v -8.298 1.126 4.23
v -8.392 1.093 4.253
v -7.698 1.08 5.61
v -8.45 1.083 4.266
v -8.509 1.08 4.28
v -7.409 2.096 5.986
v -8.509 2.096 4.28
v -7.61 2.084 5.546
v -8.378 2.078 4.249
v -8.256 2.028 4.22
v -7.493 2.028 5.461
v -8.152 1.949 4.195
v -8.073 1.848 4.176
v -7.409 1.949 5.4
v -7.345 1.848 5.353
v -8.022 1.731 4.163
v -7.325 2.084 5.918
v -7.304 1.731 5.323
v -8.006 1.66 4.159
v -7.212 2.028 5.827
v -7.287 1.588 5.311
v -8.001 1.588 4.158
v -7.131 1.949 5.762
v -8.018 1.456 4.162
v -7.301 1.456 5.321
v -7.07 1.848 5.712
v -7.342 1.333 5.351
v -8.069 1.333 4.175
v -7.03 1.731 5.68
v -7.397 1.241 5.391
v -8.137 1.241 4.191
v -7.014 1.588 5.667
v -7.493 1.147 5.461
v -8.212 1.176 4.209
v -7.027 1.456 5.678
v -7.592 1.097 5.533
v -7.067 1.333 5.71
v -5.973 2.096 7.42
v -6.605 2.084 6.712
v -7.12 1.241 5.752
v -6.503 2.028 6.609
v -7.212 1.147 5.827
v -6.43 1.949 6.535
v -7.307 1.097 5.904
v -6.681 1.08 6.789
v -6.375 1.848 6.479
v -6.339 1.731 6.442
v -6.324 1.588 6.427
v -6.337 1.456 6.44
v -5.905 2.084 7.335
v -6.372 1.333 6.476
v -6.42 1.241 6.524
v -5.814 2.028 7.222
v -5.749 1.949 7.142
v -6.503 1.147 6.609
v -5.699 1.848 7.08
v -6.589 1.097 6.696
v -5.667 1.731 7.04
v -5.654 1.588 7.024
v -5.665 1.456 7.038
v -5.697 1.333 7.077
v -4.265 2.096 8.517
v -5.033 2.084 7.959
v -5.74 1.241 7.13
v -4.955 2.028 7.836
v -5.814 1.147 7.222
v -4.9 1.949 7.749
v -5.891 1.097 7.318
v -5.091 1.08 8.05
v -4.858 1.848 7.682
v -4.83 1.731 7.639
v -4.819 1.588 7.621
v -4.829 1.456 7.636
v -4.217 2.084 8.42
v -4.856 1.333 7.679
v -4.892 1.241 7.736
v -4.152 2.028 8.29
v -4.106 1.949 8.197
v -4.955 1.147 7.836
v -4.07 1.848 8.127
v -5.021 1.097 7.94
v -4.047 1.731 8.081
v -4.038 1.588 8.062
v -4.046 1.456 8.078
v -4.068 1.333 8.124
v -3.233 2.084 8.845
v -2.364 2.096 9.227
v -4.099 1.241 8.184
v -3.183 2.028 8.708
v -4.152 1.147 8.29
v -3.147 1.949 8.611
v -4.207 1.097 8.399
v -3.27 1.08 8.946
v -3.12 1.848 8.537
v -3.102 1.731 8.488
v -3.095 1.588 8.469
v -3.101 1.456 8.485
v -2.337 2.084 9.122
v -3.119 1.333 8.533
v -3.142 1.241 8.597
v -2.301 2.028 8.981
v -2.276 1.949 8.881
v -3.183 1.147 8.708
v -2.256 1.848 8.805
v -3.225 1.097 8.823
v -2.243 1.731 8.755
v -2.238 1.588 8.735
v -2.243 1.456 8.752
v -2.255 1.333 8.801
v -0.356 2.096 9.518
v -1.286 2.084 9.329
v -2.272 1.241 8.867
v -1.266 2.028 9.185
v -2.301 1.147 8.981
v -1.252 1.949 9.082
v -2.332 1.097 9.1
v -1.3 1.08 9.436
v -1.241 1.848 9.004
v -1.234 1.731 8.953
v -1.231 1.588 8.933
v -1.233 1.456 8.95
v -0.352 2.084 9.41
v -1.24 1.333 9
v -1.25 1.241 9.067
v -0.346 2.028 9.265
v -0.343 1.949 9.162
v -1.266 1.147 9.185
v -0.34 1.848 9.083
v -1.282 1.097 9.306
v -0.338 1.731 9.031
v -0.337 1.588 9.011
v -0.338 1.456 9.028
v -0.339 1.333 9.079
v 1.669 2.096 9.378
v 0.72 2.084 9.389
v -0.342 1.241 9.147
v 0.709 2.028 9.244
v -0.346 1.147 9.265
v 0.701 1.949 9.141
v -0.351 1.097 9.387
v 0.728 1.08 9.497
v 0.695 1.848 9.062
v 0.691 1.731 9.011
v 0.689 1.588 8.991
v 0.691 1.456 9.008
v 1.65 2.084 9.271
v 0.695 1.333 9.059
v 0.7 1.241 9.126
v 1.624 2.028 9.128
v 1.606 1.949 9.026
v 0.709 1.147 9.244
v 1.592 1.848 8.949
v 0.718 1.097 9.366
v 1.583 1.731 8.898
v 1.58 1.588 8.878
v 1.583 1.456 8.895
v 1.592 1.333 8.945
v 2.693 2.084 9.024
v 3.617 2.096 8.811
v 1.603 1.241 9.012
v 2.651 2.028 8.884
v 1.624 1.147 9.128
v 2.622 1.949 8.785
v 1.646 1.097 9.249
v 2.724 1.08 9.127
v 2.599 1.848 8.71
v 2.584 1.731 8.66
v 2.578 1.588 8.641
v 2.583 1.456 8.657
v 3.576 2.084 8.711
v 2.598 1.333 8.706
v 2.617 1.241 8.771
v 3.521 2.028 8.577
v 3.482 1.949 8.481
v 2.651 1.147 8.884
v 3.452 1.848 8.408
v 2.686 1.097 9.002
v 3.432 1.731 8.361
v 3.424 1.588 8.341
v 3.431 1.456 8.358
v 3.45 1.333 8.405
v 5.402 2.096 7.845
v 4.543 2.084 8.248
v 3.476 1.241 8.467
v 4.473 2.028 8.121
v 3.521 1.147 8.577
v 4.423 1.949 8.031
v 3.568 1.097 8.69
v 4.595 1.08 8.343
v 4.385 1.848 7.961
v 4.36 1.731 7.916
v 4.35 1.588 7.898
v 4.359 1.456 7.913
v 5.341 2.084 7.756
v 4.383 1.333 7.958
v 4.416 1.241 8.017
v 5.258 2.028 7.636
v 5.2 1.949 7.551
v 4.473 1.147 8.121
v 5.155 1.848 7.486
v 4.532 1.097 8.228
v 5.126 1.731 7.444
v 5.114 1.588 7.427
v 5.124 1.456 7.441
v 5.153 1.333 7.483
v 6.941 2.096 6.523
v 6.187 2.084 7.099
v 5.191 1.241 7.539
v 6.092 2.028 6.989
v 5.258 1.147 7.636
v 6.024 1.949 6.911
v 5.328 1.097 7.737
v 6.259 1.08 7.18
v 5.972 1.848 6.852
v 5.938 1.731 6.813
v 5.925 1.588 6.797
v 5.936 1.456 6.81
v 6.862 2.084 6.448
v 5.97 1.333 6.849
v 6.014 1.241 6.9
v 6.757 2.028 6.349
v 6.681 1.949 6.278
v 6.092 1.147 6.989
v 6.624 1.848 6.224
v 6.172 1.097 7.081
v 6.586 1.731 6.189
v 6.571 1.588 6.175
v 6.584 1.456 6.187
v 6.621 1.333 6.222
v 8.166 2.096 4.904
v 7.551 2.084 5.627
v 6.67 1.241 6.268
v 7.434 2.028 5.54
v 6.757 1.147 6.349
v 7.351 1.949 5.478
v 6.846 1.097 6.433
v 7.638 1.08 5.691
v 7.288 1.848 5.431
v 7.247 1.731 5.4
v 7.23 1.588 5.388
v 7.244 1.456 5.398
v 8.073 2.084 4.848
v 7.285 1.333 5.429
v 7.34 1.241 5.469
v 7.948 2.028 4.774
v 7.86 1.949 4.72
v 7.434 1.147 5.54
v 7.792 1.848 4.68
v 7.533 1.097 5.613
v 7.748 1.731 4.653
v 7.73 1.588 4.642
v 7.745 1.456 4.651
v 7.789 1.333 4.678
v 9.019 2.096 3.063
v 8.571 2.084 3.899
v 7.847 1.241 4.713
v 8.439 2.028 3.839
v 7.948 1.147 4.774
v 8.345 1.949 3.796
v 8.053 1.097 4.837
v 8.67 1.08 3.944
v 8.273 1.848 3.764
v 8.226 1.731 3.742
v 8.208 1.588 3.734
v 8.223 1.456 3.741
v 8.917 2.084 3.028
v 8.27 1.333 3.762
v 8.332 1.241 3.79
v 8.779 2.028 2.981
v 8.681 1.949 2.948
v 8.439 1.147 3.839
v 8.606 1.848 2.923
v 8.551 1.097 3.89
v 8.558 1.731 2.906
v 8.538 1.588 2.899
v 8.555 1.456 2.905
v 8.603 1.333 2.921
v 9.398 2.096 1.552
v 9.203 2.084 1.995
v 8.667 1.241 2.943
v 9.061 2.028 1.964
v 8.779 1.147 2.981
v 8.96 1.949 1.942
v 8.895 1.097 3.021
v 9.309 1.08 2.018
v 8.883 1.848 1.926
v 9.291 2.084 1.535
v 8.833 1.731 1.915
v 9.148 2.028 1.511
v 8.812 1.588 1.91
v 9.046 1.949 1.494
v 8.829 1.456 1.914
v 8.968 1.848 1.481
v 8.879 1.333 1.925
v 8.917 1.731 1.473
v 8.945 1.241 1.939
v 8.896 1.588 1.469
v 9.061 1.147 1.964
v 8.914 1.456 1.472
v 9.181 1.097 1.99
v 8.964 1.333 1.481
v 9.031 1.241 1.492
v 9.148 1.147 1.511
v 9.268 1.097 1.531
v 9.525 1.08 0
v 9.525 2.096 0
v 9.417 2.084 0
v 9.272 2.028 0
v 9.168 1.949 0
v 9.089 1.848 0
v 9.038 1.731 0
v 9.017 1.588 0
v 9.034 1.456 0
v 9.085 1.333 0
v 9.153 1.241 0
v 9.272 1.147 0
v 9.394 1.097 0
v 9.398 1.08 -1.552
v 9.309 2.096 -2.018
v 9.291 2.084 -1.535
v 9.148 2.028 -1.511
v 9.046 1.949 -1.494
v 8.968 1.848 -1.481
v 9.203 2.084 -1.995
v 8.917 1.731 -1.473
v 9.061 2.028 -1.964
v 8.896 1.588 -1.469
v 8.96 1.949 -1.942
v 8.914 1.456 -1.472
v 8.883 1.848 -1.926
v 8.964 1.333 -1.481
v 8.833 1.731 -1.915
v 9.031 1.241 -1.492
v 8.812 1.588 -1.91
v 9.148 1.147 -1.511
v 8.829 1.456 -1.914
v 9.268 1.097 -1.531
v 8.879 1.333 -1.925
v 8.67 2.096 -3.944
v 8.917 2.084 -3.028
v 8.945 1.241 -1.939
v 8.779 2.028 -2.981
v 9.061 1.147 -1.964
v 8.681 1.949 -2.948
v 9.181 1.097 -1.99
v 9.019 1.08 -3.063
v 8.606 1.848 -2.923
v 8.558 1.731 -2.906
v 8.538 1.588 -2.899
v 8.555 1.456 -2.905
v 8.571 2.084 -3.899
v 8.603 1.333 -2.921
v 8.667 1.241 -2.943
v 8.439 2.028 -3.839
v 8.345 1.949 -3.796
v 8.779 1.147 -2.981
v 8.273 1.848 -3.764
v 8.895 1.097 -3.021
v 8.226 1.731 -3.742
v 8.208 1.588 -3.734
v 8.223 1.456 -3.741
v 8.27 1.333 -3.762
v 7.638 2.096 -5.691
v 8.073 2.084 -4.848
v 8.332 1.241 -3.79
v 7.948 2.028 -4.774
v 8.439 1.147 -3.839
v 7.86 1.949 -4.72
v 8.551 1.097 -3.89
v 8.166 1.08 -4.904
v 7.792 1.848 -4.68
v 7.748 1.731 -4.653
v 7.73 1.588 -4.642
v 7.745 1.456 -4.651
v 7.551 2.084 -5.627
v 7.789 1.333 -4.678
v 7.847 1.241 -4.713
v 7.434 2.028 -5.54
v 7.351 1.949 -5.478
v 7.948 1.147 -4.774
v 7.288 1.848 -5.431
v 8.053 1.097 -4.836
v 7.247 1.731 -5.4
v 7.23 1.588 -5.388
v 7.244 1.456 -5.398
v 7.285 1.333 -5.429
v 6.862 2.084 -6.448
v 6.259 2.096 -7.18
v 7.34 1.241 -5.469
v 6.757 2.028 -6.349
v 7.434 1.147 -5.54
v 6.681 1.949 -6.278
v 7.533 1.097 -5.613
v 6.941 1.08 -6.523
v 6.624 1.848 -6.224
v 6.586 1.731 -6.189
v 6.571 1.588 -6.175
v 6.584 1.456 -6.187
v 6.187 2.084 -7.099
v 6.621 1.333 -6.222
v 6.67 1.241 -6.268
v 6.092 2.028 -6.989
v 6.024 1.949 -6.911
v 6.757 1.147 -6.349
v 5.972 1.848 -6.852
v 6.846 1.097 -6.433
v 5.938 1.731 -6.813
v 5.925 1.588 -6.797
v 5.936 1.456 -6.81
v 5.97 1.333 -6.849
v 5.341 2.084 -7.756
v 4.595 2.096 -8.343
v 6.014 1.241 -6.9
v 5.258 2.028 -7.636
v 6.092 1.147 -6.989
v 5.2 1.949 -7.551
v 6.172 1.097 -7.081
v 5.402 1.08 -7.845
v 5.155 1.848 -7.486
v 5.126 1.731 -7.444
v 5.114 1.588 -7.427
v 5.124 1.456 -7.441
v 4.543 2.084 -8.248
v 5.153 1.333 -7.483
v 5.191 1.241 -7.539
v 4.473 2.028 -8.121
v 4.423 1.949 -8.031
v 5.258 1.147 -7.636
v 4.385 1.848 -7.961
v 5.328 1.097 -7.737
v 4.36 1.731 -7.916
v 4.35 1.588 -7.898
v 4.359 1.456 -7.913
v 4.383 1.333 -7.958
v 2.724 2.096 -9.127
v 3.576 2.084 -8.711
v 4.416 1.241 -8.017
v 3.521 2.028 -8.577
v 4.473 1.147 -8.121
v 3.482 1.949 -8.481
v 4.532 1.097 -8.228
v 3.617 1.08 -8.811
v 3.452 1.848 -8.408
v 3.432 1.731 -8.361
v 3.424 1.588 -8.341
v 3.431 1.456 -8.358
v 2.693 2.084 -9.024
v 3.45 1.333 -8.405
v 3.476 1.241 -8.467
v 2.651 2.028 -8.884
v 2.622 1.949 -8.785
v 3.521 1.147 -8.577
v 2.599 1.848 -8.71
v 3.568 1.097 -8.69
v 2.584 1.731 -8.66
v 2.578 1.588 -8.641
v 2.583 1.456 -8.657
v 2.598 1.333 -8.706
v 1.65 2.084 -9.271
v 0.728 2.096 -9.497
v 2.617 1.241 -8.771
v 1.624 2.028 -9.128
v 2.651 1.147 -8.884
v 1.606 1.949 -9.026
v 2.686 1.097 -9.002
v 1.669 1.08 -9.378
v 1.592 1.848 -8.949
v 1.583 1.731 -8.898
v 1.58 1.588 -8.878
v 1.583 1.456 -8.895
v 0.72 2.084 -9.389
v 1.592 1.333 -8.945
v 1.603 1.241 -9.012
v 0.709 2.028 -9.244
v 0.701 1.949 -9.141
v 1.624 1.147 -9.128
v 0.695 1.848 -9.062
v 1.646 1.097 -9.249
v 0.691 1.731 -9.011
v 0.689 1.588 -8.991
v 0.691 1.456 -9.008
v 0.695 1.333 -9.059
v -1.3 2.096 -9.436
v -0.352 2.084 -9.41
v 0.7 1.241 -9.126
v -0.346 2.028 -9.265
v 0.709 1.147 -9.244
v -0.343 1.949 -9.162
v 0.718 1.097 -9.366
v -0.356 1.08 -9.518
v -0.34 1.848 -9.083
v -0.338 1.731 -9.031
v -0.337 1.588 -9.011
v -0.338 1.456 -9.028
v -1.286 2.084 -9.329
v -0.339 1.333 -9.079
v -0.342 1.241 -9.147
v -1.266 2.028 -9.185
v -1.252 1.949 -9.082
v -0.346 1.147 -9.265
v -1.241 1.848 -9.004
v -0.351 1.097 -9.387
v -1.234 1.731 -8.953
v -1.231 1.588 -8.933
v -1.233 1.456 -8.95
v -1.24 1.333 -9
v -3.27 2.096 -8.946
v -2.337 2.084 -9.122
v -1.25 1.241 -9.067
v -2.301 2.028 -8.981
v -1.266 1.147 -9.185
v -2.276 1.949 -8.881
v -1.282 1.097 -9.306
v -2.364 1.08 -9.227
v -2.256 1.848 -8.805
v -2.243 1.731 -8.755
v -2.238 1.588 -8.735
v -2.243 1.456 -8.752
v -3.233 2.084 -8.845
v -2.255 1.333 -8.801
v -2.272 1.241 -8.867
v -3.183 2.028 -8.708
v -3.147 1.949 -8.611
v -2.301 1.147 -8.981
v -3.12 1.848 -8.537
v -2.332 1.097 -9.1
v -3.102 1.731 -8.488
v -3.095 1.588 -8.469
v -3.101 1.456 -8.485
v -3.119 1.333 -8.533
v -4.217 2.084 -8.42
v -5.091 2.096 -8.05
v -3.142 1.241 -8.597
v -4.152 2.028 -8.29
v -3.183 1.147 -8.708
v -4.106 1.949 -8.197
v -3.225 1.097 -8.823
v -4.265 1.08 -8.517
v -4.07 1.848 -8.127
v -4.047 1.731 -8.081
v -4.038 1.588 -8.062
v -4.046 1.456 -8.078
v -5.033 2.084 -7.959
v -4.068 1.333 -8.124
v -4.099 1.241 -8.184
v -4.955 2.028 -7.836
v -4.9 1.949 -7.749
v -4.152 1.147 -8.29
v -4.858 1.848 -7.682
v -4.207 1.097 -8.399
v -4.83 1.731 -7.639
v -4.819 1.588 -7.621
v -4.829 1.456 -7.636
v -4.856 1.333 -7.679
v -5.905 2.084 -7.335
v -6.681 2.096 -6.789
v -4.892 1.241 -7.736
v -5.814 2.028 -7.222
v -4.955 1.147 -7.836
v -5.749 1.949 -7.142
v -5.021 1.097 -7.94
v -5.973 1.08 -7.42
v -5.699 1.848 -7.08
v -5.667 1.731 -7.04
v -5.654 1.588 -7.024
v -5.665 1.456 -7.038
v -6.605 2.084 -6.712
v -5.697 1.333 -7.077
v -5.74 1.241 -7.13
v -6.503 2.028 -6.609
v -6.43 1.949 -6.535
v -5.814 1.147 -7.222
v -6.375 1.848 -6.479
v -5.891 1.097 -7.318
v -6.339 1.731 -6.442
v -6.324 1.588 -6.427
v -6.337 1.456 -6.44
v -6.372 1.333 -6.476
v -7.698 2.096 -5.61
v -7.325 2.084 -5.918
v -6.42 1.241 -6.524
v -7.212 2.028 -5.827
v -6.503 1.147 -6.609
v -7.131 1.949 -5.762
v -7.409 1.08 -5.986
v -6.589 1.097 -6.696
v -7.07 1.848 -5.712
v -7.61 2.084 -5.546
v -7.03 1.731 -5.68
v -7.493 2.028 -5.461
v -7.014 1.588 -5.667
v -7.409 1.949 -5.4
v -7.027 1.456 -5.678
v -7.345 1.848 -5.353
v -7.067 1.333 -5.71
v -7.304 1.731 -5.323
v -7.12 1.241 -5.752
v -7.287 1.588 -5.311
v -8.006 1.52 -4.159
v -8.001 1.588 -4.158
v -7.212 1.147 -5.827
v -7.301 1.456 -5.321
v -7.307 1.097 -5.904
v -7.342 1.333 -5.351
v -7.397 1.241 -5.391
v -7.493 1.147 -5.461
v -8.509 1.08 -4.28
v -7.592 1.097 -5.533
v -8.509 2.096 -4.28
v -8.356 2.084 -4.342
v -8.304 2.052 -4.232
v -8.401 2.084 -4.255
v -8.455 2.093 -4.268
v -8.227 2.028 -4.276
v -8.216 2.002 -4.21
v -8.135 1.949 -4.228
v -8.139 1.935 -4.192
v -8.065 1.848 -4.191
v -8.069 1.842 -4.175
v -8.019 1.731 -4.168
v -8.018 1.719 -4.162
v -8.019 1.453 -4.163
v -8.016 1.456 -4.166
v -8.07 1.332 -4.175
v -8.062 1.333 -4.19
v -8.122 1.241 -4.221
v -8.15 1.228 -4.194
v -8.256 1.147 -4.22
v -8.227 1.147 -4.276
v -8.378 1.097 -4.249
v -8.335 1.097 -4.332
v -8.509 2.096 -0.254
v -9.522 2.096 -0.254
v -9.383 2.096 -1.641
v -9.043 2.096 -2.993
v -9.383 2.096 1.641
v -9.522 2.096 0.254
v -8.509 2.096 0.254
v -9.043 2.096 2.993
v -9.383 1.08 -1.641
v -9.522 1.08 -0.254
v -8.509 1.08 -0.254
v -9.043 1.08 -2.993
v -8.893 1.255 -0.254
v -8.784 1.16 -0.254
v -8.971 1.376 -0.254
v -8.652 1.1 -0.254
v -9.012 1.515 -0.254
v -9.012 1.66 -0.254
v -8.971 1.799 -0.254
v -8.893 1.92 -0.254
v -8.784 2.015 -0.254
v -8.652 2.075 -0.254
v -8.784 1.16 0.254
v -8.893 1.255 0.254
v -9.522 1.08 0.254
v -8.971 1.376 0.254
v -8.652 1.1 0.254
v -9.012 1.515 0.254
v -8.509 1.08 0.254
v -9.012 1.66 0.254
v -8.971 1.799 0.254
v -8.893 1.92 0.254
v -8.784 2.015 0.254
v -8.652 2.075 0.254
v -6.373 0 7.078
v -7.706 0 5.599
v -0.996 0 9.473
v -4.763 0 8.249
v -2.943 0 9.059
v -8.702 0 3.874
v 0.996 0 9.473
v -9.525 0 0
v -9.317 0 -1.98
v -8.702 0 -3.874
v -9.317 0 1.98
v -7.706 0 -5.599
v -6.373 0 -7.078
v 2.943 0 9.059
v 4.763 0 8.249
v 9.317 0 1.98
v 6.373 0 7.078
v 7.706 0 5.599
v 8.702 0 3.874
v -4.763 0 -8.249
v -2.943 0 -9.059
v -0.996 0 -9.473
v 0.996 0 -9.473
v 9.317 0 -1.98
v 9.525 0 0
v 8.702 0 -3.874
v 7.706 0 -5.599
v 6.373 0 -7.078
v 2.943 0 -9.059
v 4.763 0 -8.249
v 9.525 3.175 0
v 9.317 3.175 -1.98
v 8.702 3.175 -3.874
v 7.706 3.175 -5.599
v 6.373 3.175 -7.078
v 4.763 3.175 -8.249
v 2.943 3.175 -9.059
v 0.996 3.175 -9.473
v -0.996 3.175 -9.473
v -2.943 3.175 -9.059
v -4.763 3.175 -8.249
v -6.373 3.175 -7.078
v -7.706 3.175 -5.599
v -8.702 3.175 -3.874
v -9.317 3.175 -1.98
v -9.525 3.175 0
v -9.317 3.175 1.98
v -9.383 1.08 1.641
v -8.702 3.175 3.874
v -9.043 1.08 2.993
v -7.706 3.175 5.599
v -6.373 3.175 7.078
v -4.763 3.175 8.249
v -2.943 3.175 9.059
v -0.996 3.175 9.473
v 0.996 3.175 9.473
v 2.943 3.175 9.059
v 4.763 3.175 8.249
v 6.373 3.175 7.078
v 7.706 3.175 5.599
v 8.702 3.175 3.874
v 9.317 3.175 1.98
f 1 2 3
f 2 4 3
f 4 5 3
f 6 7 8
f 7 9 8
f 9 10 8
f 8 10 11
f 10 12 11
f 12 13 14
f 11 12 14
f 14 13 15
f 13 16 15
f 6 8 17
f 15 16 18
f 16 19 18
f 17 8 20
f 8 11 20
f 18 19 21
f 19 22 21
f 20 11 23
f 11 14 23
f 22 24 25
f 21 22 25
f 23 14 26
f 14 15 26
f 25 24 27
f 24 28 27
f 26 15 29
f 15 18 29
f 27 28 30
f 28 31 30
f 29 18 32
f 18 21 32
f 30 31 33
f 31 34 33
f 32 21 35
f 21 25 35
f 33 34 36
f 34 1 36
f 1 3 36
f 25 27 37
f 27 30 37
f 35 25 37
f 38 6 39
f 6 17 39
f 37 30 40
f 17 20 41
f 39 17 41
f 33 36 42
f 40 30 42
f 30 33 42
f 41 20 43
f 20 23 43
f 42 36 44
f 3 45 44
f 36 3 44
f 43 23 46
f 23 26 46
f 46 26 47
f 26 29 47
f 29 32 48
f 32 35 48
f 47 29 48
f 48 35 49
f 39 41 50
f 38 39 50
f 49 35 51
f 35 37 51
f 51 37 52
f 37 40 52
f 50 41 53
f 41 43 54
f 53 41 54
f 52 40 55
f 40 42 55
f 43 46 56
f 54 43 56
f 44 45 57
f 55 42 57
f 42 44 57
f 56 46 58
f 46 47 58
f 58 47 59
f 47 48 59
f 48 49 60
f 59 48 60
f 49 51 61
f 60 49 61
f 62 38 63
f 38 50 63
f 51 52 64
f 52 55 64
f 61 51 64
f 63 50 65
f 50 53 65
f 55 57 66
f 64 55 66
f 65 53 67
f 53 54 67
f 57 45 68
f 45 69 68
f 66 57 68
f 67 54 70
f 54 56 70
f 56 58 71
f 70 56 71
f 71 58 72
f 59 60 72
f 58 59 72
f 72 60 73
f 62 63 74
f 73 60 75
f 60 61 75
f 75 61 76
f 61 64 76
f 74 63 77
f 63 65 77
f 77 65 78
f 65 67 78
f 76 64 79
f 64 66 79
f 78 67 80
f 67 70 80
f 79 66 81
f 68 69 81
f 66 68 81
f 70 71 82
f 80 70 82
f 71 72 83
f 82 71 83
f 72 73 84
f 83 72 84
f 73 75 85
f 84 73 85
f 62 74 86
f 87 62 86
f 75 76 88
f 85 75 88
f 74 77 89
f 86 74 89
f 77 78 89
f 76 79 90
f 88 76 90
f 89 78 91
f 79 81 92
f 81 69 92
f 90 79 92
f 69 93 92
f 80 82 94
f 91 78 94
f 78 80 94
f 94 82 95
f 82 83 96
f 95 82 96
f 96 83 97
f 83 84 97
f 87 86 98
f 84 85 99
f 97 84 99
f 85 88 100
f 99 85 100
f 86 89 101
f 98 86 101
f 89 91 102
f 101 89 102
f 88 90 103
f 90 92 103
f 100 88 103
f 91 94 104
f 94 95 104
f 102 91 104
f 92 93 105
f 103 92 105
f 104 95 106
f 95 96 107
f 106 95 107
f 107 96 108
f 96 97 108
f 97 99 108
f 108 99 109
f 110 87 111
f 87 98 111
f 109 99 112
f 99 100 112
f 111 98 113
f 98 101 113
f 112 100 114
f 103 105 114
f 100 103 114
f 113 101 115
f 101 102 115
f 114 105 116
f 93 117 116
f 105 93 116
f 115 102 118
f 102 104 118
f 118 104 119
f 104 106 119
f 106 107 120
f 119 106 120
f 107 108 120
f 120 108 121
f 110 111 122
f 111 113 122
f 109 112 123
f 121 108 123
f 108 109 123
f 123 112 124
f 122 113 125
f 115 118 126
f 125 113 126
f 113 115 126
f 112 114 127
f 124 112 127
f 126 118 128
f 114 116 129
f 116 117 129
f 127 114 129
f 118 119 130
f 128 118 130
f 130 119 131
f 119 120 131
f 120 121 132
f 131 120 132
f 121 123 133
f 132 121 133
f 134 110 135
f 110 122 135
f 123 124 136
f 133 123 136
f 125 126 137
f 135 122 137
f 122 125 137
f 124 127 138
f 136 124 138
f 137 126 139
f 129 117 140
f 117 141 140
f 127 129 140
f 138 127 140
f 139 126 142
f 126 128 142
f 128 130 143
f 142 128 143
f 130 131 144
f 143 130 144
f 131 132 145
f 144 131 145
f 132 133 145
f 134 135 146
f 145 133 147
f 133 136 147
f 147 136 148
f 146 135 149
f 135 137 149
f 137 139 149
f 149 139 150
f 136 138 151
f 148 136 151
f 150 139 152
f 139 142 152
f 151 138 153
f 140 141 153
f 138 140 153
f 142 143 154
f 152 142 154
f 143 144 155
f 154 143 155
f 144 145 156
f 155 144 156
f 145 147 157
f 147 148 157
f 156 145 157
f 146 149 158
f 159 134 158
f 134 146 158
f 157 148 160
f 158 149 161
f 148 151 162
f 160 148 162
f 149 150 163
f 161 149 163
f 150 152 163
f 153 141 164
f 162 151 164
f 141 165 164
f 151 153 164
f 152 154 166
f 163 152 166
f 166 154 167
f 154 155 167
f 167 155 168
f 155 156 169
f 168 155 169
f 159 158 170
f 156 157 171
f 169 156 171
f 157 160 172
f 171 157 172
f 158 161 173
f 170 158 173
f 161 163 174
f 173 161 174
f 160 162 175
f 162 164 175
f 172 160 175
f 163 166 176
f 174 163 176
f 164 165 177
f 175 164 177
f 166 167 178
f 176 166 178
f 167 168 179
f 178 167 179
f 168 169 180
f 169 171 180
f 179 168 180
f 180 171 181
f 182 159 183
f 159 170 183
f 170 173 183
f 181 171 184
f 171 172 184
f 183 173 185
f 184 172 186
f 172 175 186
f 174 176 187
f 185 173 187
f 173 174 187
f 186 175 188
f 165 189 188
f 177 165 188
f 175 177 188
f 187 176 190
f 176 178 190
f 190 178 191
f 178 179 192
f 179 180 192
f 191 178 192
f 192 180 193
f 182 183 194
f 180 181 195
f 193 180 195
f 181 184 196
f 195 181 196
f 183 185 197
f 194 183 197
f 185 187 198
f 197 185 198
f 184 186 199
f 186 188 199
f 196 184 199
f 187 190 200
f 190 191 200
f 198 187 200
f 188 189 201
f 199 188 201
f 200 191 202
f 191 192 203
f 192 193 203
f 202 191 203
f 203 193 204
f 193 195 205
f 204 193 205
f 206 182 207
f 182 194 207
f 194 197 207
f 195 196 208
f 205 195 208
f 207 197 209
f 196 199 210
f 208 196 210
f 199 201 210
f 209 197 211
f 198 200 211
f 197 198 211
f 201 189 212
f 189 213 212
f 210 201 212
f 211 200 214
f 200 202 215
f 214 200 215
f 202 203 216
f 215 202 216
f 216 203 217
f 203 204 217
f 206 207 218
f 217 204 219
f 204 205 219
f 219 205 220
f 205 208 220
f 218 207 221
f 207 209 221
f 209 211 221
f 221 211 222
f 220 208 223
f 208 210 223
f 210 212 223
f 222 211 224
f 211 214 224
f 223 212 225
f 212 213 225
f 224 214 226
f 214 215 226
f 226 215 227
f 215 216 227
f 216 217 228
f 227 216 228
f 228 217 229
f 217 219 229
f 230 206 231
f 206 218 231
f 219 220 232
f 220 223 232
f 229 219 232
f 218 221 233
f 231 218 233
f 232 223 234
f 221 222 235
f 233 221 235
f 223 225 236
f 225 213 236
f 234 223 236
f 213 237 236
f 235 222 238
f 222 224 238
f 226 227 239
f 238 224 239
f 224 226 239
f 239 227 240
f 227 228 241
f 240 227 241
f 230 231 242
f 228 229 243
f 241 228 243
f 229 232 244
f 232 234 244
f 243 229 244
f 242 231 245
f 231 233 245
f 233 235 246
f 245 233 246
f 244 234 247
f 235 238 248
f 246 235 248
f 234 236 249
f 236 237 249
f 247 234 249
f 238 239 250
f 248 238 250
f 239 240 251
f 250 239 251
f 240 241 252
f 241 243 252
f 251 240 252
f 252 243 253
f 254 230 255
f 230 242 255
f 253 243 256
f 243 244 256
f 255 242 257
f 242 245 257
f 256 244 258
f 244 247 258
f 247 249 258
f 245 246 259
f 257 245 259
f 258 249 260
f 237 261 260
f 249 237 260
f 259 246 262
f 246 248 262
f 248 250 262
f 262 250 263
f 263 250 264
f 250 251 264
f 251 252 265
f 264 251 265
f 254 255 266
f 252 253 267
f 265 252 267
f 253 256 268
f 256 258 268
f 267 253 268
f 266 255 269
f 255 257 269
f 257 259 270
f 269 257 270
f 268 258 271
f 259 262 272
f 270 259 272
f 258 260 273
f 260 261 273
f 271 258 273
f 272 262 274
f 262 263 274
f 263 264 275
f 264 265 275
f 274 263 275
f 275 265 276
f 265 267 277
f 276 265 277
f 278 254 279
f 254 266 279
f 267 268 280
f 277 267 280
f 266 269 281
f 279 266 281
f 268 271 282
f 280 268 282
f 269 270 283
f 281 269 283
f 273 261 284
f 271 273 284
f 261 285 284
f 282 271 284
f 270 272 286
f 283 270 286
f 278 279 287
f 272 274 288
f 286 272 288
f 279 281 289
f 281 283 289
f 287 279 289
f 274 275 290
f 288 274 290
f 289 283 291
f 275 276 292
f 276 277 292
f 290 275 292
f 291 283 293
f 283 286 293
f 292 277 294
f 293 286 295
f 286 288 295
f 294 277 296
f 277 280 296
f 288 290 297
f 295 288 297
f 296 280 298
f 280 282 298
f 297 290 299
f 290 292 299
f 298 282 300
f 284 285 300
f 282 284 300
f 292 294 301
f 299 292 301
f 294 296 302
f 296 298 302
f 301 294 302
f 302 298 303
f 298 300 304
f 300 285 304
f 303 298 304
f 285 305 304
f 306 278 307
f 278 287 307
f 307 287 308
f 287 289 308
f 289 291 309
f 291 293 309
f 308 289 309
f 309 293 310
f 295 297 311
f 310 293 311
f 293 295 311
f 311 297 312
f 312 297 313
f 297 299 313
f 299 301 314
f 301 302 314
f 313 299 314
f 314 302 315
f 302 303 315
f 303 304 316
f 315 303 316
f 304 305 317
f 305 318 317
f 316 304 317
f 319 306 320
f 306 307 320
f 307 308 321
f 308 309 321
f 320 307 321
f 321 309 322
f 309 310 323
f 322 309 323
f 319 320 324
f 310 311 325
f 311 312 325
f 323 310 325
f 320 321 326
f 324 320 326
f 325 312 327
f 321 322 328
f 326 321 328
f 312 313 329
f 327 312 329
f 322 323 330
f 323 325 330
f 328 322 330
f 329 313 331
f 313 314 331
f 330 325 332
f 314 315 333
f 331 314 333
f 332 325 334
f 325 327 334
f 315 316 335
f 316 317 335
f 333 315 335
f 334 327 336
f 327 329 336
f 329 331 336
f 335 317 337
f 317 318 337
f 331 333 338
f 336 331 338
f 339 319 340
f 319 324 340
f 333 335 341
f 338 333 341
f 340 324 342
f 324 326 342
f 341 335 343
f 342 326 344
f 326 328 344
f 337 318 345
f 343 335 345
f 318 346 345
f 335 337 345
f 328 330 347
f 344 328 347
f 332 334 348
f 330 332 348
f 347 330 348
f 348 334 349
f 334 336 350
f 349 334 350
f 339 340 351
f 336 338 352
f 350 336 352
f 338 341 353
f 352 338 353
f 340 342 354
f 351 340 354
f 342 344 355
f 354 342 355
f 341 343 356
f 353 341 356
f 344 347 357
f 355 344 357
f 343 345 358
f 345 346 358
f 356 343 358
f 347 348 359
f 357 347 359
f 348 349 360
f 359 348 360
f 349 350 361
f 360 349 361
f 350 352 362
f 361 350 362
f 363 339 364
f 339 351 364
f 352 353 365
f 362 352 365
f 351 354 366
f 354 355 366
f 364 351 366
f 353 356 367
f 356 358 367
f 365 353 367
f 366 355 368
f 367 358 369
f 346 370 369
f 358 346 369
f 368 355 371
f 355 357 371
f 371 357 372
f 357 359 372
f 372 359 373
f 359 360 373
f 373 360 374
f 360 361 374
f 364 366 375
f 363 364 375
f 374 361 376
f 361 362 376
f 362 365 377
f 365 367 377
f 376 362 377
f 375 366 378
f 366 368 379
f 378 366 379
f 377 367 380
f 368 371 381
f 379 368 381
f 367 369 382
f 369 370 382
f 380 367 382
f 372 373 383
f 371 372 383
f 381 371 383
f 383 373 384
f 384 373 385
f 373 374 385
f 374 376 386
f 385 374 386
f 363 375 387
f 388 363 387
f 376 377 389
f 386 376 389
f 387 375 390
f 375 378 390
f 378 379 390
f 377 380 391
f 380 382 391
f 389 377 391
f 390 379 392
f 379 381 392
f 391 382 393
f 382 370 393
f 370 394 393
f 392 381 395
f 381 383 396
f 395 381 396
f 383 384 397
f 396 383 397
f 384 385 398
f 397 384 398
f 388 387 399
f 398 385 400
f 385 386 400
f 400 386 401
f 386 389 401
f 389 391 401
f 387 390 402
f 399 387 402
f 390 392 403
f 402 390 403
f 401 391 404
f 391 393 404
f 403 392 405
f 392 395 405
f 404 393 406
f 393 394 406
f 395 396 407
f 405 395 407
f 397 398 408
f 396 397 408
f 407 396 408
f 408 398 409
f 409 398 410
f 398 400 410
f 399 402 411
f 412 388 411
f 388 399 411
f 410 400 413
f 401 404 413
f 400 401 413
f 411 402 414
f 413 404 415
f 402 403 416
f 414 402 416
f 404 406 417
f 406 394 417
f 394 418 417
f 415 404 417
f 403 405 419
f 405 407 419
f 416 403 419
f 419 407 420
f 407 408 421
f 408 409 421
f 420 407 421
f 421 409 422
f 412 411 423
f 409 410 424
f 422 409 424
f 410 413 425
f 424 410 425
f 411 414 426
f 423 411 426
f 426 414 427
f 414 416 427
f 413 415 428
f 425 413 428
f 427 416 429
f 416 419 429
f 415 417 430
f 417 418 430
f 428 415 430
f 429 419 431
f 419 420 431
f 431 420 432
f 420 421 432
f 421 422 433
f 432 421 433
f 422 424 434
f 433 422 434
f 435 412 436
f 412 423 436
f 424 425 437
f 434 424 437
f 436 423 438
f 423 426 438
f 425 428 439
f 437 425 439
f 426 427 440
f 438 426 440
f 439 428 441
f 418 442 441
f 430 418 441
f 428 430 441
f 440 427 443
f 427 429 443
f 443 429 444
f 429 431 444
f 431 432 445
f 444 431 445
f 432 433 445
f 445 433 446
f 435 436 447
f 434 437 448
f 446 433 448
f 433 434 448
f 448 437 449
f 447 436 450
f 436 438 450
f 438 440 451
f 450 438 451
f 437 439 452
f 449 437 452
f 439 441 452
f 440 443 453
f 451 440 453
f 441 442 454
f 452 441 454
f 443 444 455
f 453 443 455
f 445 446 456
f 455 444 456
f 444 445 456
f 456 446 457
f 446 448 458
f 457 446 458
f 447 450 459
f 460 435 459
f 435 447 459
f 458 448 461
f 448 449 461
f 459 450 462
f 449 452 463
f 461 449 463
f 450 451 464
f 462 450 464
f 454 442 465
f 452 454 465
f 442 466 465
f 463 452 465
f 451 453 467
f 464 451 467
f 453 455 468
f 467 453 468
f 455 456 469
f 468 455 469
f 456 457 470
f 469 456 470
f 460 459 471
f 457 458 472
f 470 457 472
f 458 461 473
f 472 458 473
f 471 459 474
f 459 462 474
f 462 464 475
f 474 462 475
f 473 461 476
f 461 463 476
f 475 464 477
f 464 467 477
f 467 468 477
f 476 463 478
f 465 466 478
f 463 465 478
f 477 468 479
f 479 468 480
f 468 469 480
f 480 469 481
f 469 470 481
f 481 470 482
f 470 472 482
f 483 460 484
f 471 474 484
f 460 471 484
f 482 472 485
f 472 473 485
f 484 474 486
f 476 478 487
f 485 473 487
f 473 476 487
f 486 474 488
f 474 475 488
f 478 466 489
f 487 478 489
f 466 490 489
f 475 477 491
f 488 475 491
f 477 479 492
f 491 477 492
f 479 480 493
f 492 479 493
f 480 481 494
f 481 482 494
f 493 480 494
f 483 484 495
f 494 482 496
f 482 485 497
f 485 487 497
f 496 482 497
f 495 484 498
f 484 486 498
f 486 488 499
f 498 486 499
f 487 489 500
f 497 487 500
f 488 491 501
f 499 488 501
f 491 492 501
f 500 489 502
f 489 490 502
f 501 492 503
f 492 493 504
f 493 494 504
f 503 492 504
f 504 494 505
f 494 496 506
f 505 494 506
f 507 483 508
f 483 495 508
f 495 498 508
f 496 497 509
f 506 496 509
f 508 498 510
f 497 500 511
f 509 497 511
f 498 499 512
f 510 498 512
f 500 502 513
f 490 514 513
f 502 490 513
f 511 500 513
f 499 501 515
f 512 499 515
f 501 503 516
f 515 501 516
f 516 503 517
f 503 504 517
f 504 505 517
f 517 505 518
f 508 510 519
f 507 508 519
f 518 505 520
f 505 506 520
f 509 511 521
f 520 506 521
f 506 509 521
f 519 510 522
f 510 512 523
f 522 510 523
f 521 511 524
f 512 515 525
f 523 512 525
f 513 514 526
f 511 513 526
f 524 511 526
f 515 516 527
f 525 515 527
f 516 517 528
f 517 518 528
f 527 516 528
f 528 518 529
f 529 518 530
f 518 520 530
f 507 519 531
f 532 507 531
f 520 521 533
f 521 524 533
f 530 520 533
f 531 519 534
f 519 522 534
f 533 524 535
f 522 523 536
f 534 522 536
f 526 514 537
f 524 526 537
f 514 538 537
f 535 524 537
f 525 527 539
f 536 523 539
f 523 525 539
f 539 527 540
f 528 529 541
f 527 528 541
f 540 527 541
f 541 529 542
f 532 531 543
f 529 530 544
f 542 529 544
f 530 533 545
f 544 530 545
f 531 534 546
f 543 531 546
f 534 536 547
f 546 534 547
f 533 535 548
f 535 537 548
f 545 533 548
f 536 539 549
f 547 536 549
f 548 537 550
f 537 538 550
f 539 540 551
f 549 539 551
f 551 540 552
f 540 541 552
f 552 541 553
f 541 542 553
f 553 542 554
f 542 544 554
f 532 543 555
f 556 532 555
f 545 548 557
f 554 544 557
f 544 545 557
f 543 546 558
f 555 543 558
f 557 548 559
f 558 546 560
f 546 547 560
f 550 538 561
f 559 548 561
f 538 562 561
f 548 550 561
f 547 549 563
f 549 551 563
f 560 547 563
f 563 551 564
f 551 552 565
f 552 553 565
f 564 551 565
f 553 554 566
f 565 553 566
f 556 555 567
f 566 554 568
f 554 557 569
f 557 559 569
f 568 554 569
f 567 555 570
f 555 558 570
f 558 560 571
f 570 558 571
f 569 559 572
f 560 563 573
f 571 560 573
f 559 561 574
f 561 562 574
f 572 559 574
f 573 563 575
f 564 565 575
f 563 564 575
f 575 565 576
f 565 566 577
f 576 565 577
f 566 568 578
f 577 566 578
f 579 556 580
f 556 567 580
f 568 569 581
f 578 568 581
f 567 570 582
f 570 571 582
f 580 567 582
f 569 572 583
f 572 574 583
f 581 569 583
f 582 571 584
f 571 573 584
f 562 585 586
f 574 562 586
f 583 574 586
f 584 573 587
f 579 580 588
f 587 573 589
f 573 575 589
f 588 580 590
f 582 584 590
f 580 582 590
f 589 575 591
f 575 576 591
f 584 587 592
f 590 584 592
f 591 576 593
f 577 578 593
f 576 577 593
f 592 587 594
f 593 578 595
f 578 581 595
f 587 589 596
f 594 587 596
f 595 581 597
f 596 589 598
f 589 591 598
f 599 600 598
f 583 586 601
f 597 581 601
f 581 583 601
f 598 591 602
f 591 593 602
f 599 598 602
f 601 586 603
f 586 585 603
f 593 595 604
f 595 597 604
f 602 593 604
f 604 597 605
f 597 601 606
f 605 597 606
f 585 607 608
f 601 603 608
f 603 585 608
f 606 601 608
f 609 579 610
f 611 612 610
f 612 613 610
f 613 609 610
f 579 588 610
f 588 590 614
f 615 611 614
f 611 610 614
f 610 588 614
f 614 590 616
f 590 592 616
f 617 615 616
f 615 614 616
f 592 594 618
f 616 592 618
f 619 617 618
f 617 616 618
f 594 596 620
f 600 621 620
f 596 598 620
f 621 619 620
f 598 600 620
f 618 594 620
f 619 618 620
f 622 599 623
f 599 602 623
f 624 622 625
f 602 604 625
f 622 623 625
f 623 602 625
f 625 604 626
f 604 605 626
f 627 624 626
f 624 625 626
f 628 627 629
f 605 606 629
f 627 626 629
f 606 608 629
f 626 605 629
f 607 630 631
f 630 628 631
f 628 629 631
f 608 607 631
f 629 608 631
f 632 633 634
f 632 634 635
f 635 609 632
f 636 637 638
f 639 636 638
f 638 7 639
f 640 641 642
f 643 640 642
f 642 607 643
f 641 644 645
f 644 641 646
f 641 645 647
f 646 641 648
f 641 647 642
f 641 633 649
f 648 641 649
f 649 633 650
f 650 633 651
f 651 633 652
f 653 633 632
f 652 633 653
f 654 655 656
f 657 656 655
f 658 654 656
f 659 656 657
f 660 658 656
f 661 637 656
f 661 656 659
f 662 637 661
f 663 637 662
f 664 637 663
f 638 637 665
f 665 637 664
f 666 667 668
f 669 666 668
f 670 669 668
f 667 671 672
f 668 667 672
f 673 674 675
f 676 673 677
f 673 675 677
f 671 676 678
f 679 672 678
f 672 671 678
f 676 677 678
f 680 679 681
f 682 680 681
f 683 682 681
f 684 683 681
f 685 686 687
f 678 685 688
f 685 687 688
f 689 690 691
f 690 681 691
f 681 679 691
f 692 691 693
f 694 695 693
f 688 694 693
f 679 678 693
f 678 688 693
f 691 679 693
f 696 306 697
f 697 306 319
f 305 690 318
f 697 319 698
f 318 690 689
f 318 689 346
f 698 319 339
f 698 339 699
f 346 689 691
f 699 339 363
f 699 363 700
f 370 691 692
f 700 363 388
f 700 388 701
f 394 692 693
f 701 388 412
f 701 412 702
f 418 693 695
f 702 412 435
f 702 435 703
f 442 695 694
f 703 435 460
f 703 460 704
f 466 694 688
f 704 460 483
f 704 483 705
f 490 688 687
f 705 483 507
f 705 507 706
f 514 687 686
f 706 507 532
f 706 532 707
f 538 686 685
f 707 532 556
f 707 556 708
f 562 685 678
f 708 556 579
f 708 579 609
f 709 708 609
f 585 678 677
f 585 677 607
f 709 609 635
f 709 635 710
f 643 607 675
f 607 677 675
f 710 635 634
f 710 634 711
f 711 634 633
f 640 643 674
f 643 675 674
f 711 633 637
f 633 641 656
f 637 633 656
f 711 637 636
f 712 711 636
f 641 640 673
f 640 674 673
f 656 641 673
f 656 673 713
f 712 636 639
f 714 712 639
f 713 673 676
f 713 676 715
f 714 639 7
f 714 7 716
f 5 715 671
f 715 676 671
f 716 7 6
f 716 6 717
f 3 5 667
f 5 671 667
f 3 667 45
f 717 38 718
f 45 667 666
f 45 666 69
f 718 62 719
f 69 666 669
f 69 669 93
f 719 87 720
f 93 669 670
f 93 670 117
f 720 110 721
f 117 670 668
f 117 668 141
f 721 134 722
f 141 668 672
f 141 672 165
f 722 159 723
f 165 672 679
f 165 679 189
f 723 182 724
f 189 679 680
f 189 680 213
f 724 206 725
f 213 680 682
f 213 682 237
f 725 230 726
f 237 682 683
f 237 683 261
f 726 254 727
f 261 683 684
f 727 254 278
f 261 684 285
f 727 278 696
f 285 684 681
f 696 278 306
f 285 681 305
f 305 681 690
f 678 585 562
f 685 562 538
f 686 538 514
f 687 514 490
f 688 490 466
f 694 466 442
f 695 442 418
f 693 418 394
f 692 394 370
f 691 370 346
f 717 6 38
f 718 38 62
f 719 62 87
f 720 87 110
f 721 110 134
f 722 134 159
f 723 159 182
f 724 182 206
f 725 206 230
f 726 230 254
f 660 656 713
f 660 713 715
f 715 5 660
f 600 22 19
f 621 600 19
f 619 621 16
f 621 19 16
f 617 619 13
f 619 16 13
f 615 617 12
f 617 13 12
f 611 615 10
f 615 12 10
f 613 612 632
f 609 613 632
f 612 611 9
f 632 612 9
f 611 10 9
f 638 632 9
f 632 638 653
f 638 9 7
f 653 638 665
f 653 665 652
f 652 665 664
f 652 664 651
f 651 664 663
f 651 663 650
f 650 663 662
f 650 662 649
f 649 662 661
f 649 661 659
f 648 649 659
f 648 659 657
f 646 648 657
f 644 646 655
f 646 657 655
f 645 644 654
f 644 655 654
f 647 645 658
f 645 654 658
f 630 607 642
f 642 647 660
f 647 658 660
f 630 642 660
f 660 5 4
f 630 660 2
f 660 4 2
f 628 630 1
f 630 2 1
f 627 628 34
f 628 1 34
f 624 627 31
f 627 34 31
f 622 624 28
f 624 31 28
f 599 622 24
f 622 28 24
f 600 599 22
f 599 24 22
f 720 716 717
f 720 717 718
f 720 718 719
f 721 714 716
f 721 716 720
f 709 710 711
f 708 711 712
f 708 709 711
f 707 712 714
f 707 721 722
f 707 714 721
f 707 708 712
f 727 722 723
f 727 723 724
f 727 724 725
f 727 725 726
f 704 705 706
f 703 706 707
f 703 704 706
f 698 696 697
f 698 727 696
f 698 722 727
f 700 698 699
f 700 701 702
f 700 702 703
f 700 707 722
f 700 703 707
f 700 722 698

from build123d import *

# Parameters (mm, degrees)
SKETCH1_R           = 9.525
BOSS_EXTRUDE1_DEPTH = 3.175
SKETCH3_R           = 0.508
CUT_EXTRUDE1_DEPTH  = 25.4
SKETCH6_W           = 1.016
SKETCH6_H           = 1.016
CUT_EXTRUDE2_DEPTH  = 7.366
SKETCH7_W           = 1.012612731
SKETCH7_H           = 1.016
CUT_EXTRUDE3_DEPTH  = 7.366
SKETCH4_R           = 0.508


with BuildPart() as part:
    # Sketch1 → Boss-Extrude1 (new body)
    with BuildSketch(Plane(origin=(0, 0, 0), x_dir=(1, 0, 0), z_dir=(0, 1, 0))):
        Circle(SKETCH1_R)
    extrude(amount=BOSS_EXTRUDE1_DEPTH)

    # Sketch3 → Cut-Extrude1 (cut, symmetric)
    with BuildSketch(Plane.XY):
        with Locations((-8.509, 1.5875)):
            Circle(SKETCH3_R)
    extrude(amount=CUT_EXTRUDE1_DEPTH, both=True, mode=Mode.SUBTRACT)

    # Sketch6 → Cut-Extrude2 (cut)
    with BuildSketch(Plane.XY.offset(-7.62)):
        with Locations((-9.017, 1.5875)):
            Rectangle(SKETCH6_W, SKETCH6_H)
    extrude(amount=CUT_EXTRUDE2_DEPTH, mode=Mode.SUBTRACT)

    # Sketch7 → Cut-Extrude3 (cut)
    with BuildSketch(Plane.XY.offset(7.62)):
        with Locations((-9.015306366, 1.5875)):
            Rectangle(SKETCH7_W, SKETCH7_H)
    extrude(amount=-CUT_EXTRUDE3_DEPTH, mode=Mode.SUBTRACT)

    # Cut-Sweep1: sweep along a path in Sketch5
    with BuildLine(Plane(origin=(0, 0, 0), x_dir=(1, 0, 0), z_dir=(0, 1, 0))) as cut_sweep1_path:
        ThreePointArc((-7.554809844, -0.994609585), (7.62, 0), (-7.554809844, 0.994609585))
    # Sketch4 → Cut-Sweep1 (sweep, cut)
    with BuildSketch(Plane.XY):
        with Locations((9.525, 1.5875)):
            Circle(SKETCH4_R)
    sweep(path=cut_sweep1_path.line, mode=Mode.SUBTRACT)


solid = part.part
